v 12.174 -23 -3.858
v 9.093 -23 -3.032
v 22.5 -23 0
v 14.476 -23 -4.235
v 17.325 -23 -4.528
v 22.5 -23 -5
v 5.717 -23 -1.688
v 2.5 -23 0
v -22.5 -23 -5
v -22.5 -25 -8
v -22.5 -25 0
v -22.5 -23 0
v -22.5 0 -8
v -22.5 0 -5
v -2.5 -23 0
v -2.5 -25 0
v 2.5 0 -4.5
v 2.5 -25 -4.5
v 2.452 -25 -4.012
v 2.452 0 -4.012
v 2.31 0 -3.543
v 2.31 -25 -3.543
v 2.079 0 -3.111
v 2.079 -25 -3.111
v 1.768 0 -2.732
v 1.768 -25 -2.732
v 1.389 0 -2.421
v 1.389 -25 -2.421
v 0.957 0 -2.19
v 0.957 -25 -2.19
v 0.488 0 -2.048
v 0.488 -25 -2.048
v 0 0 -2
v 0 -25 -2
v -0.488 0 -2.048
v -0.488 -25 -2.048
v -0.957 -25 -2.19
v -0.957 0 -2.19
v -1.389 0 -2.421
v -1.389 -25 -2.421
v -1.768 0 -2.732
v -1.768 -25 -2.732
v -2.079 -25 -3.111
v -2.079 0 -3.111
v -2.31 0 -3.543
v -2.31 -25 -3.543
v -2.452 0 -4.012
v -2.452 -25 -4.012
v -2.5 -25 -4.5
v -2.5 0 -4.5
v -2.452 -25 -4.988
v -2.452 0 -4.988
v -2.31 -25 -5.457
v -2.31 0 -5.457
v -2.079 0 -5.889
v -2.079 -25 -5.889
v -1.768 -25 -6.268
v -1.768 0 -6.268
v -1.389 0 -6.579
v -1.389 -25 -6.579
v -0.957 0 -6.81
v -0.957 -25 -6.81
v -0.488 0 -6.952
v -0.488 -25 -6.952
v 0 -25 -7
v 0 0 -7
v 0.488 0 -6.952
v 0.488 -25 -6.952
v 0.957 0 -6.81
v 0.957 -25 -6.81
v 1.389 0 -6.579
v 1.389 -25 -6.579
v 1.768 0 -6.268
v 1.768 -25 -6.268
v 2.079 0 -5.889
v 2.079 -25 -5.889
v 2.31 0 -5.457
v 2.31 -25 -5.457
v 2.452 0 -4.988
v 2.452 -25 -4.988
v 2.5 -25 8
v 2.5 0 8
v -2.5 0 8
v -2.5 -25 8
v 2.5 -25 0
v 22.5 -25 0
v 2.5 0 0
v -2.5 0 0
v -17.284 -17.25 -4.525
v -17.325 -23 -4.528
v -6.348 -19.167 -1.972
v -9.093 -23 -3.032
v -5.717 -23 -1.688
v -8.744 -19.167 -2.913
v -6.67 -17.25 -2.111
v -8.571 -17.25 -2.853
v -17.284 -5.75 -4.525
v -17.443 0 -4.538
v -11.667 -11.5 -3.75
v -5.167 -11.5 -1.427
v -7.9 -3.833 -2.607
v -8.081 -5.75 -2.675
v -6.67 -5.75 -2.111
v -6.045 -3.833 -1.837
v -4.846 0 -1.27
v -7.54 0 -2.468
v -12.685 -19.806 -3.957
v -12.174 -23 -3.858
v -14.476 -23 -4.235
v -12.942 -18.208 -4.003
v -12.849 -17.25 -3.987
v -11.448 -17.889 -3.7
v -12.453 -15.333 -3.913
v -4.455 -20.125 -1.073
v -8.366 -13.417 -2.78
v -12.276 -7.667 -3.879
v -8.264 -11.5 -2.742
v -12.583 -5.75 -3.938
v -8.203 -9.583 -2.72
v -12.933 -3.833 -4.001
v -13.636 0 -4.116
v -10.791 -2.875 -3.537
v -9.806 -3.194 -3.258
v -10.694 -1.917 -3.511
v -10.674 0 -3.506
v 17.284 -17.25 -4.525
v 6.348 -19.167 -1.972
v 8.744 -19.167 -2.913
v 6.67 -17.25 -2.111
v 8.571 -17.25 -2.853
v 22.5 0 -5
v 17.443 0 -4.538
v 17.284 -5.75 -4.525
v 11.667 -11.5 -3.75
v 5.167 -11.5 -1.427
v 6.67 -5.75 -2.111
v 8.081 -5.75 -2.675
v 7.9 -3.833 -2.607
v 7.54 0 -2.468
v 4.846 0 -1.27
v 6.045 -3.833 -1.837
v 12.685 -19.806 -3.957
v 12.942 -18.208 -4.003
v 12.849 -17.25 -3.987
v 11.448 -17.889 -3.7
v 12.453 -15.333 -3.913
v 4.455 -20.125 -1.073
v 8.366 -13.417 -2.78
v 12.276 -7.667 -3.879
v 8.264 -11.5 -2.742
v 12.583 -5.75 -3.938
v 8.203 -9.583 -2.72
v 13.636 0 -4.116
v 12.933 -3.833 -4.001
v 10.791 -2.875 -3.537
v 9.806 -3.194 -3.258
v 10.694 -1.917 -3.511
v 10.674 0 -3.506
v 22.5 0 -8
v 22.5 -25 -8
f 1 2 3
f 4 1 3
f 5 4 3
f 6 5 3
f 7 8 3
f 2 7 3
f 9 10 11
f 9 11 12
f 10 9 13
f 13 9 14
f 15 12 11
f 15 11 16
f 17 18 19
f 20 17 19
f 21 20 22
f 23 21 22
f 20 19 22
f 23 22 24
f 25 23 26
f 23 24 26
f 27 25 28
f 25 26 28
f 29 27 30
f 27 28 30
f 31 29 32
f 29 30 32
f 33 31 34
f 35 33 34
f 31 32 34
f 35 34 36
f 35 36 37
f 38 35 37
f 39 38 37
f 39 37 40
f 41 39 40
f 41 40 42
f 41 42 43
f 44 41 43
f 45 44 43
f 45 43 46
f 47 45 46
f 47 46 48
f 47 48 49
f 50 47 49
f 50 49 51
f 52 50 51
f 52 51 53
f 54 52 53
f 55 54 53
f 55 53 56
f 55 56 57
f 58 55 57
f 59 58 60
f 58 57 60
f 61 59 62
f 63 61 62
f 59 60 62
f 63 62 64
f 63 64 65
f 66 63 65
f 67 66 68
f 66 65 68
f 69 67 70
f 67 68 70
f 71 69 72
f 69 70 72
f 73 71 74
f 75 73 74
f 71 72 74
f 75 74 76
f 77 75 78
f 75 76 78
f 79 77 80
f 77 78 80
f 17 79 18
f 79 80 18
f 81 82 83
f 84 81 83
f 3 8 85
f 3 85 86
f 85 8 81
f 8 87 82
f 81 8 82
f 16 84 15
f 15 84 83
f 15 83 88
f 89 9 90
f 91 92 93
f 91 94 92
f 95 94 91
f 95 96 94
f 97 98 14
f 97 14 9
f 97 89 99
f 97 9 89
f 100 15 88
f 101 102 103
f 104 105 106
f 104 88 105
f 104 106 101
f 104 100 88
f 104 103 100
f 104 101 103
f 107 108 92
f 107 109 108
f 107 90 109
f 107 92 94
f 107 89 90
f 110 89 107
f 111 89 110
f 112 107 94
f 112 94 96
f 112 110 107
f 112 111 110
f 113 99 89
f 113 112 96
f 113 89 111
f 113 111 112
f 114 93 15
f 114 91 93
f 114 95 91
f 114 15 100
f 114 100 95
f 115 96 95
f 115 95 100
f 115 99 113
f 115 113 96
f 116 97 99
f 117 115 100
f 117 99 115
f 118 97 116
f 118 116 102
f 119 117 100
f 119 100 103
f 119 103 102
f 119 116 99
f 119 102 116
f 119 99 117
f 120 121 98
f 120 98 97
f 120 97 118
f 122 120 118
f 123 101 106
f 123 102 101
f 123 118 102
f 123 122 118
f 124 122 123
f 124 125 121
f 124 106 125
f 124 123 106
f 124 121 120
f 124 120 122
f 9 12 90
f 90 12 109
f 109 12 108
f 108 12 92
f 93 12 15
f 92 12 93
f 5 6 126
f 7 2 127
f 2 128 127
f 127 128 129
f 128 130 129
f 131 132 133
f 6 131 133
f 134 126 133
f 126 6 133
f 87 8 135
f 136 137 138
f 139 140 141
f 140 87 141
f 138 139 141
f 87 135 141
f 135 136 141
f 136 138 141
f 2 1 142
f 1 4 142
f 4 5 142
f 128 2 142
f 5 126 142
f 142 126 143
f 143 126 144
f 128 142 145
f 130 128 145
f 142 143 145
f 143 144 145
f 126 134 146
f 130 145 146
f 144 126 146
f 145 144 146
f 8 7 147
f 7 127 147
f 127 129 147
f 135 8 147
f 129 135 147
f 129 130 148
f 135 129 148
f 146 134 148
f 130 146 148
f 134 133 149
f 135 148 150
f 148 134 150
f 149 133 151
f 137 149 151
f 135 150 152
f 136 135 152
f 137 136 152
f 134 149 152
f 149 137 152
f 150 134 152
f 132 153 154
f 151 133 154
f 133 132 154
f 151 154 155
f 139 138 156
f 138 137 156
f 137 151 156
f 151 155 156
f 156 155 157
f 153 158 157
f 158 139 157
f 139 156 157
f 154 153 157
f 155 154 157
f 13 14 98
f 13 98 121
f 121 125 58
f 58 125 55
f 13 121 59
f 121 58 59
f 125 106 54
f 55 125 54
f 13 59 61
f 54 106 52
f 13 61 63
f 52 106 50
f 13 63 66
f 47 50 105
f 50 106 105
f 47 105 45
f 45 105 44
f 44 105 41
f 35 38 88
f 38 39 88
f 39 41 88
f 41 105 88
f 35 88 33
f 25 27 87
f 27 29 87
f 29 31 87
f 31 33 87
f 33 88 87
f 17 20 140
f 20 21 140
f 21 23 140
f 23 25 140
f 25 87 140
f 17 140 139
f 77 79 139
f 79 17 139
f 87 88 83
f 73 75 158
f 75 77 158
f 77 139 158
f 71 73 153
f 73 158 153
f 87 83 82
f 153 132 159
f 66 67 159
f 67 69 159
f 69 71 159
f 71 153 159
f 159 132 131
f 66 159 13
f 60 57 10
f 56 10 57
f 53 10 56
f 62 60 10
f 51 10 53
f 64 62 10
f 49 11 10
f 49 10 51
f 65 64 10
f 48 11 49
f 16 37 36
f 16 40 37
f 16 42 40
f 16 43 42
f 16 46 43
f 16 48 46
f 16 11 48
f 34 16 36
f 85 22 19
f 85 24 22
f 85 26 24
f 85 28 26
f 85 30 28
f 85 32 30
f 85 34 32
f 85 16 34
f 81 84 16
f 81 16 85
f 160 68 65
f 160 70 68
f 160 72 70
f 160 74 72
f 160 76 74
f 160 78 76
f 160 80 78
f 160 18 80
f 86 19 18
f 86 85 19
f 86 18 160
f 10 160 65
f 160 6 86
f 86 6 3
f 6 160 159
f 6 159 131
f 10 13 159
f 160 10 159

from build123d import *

# Parameters (mm, degrees)
F1_DEPTH = 25
F2_W     = 45
F2_H     = 2
F3_DEPTH = 8
F4_R     = 2.5
F5_DEPTH = 25.0010001


with BuildPart() as f1:
    # F0 (on Front) → F1 (new body)
    with BuildSketch(Plane.XZ):
        with BuildLine():
            Line((2.5, 8), (-2.5, 8))
            Line((-2.5, 8), (-2.5, 0))
            add(Edge.make_bspline(
                [(-22.5, -5), (-19.3471894975, -4.5721768041), (-11.550922006, -4.5818809698), (-4.9118634705, -1.4177504321), (-2.5, 0)],
                knots=[0, 0, 0, 0, 0.5120347551, 1, 1, 1, 1], degree=3))
            Line((-22.5, -5), (-22.5, -8))
            Line((-22.5, -8), (-2.5, -8))
            Line((-2.5, -8), (2.5, -8))
            Line((2.5, -8), (22.5, -8))
            Line((22.5, -8), (22.5, -5))
            add(Edge.make_bspline(
                [(22.5, -5), (19.3471894975, -4.5721768041), (11.550922006, -4.5818809698), (4.9118634705, -1.4177504321), (2.5, 0)],
                knots=[0, 0, 0, 0, 0.5120347551, 1, 1, 1, 1], degree=3))
            Line((2.5, 0), (2.5, 8))
        make_face()
    extrude(amount=F1_DEPTH)

    # F2 (on Top) → F3 (join)
    with BuildSketch(Plane.XY):
        with Locations((0, -24)):
            Rectangle(F2_W, F2_H)
    extrude(amount=-F3_DEPTH)

    # F4 (on face) → F5 (cut, through all)
    with BuildSketch(Plane.XZ.offset(25)):
        with Locations((0, -4.5)):
            Circle(F4_R)
    extrude(amount=-F5_DEPTH, mode=Mode.SUBTRACT)


solid = f1.part
